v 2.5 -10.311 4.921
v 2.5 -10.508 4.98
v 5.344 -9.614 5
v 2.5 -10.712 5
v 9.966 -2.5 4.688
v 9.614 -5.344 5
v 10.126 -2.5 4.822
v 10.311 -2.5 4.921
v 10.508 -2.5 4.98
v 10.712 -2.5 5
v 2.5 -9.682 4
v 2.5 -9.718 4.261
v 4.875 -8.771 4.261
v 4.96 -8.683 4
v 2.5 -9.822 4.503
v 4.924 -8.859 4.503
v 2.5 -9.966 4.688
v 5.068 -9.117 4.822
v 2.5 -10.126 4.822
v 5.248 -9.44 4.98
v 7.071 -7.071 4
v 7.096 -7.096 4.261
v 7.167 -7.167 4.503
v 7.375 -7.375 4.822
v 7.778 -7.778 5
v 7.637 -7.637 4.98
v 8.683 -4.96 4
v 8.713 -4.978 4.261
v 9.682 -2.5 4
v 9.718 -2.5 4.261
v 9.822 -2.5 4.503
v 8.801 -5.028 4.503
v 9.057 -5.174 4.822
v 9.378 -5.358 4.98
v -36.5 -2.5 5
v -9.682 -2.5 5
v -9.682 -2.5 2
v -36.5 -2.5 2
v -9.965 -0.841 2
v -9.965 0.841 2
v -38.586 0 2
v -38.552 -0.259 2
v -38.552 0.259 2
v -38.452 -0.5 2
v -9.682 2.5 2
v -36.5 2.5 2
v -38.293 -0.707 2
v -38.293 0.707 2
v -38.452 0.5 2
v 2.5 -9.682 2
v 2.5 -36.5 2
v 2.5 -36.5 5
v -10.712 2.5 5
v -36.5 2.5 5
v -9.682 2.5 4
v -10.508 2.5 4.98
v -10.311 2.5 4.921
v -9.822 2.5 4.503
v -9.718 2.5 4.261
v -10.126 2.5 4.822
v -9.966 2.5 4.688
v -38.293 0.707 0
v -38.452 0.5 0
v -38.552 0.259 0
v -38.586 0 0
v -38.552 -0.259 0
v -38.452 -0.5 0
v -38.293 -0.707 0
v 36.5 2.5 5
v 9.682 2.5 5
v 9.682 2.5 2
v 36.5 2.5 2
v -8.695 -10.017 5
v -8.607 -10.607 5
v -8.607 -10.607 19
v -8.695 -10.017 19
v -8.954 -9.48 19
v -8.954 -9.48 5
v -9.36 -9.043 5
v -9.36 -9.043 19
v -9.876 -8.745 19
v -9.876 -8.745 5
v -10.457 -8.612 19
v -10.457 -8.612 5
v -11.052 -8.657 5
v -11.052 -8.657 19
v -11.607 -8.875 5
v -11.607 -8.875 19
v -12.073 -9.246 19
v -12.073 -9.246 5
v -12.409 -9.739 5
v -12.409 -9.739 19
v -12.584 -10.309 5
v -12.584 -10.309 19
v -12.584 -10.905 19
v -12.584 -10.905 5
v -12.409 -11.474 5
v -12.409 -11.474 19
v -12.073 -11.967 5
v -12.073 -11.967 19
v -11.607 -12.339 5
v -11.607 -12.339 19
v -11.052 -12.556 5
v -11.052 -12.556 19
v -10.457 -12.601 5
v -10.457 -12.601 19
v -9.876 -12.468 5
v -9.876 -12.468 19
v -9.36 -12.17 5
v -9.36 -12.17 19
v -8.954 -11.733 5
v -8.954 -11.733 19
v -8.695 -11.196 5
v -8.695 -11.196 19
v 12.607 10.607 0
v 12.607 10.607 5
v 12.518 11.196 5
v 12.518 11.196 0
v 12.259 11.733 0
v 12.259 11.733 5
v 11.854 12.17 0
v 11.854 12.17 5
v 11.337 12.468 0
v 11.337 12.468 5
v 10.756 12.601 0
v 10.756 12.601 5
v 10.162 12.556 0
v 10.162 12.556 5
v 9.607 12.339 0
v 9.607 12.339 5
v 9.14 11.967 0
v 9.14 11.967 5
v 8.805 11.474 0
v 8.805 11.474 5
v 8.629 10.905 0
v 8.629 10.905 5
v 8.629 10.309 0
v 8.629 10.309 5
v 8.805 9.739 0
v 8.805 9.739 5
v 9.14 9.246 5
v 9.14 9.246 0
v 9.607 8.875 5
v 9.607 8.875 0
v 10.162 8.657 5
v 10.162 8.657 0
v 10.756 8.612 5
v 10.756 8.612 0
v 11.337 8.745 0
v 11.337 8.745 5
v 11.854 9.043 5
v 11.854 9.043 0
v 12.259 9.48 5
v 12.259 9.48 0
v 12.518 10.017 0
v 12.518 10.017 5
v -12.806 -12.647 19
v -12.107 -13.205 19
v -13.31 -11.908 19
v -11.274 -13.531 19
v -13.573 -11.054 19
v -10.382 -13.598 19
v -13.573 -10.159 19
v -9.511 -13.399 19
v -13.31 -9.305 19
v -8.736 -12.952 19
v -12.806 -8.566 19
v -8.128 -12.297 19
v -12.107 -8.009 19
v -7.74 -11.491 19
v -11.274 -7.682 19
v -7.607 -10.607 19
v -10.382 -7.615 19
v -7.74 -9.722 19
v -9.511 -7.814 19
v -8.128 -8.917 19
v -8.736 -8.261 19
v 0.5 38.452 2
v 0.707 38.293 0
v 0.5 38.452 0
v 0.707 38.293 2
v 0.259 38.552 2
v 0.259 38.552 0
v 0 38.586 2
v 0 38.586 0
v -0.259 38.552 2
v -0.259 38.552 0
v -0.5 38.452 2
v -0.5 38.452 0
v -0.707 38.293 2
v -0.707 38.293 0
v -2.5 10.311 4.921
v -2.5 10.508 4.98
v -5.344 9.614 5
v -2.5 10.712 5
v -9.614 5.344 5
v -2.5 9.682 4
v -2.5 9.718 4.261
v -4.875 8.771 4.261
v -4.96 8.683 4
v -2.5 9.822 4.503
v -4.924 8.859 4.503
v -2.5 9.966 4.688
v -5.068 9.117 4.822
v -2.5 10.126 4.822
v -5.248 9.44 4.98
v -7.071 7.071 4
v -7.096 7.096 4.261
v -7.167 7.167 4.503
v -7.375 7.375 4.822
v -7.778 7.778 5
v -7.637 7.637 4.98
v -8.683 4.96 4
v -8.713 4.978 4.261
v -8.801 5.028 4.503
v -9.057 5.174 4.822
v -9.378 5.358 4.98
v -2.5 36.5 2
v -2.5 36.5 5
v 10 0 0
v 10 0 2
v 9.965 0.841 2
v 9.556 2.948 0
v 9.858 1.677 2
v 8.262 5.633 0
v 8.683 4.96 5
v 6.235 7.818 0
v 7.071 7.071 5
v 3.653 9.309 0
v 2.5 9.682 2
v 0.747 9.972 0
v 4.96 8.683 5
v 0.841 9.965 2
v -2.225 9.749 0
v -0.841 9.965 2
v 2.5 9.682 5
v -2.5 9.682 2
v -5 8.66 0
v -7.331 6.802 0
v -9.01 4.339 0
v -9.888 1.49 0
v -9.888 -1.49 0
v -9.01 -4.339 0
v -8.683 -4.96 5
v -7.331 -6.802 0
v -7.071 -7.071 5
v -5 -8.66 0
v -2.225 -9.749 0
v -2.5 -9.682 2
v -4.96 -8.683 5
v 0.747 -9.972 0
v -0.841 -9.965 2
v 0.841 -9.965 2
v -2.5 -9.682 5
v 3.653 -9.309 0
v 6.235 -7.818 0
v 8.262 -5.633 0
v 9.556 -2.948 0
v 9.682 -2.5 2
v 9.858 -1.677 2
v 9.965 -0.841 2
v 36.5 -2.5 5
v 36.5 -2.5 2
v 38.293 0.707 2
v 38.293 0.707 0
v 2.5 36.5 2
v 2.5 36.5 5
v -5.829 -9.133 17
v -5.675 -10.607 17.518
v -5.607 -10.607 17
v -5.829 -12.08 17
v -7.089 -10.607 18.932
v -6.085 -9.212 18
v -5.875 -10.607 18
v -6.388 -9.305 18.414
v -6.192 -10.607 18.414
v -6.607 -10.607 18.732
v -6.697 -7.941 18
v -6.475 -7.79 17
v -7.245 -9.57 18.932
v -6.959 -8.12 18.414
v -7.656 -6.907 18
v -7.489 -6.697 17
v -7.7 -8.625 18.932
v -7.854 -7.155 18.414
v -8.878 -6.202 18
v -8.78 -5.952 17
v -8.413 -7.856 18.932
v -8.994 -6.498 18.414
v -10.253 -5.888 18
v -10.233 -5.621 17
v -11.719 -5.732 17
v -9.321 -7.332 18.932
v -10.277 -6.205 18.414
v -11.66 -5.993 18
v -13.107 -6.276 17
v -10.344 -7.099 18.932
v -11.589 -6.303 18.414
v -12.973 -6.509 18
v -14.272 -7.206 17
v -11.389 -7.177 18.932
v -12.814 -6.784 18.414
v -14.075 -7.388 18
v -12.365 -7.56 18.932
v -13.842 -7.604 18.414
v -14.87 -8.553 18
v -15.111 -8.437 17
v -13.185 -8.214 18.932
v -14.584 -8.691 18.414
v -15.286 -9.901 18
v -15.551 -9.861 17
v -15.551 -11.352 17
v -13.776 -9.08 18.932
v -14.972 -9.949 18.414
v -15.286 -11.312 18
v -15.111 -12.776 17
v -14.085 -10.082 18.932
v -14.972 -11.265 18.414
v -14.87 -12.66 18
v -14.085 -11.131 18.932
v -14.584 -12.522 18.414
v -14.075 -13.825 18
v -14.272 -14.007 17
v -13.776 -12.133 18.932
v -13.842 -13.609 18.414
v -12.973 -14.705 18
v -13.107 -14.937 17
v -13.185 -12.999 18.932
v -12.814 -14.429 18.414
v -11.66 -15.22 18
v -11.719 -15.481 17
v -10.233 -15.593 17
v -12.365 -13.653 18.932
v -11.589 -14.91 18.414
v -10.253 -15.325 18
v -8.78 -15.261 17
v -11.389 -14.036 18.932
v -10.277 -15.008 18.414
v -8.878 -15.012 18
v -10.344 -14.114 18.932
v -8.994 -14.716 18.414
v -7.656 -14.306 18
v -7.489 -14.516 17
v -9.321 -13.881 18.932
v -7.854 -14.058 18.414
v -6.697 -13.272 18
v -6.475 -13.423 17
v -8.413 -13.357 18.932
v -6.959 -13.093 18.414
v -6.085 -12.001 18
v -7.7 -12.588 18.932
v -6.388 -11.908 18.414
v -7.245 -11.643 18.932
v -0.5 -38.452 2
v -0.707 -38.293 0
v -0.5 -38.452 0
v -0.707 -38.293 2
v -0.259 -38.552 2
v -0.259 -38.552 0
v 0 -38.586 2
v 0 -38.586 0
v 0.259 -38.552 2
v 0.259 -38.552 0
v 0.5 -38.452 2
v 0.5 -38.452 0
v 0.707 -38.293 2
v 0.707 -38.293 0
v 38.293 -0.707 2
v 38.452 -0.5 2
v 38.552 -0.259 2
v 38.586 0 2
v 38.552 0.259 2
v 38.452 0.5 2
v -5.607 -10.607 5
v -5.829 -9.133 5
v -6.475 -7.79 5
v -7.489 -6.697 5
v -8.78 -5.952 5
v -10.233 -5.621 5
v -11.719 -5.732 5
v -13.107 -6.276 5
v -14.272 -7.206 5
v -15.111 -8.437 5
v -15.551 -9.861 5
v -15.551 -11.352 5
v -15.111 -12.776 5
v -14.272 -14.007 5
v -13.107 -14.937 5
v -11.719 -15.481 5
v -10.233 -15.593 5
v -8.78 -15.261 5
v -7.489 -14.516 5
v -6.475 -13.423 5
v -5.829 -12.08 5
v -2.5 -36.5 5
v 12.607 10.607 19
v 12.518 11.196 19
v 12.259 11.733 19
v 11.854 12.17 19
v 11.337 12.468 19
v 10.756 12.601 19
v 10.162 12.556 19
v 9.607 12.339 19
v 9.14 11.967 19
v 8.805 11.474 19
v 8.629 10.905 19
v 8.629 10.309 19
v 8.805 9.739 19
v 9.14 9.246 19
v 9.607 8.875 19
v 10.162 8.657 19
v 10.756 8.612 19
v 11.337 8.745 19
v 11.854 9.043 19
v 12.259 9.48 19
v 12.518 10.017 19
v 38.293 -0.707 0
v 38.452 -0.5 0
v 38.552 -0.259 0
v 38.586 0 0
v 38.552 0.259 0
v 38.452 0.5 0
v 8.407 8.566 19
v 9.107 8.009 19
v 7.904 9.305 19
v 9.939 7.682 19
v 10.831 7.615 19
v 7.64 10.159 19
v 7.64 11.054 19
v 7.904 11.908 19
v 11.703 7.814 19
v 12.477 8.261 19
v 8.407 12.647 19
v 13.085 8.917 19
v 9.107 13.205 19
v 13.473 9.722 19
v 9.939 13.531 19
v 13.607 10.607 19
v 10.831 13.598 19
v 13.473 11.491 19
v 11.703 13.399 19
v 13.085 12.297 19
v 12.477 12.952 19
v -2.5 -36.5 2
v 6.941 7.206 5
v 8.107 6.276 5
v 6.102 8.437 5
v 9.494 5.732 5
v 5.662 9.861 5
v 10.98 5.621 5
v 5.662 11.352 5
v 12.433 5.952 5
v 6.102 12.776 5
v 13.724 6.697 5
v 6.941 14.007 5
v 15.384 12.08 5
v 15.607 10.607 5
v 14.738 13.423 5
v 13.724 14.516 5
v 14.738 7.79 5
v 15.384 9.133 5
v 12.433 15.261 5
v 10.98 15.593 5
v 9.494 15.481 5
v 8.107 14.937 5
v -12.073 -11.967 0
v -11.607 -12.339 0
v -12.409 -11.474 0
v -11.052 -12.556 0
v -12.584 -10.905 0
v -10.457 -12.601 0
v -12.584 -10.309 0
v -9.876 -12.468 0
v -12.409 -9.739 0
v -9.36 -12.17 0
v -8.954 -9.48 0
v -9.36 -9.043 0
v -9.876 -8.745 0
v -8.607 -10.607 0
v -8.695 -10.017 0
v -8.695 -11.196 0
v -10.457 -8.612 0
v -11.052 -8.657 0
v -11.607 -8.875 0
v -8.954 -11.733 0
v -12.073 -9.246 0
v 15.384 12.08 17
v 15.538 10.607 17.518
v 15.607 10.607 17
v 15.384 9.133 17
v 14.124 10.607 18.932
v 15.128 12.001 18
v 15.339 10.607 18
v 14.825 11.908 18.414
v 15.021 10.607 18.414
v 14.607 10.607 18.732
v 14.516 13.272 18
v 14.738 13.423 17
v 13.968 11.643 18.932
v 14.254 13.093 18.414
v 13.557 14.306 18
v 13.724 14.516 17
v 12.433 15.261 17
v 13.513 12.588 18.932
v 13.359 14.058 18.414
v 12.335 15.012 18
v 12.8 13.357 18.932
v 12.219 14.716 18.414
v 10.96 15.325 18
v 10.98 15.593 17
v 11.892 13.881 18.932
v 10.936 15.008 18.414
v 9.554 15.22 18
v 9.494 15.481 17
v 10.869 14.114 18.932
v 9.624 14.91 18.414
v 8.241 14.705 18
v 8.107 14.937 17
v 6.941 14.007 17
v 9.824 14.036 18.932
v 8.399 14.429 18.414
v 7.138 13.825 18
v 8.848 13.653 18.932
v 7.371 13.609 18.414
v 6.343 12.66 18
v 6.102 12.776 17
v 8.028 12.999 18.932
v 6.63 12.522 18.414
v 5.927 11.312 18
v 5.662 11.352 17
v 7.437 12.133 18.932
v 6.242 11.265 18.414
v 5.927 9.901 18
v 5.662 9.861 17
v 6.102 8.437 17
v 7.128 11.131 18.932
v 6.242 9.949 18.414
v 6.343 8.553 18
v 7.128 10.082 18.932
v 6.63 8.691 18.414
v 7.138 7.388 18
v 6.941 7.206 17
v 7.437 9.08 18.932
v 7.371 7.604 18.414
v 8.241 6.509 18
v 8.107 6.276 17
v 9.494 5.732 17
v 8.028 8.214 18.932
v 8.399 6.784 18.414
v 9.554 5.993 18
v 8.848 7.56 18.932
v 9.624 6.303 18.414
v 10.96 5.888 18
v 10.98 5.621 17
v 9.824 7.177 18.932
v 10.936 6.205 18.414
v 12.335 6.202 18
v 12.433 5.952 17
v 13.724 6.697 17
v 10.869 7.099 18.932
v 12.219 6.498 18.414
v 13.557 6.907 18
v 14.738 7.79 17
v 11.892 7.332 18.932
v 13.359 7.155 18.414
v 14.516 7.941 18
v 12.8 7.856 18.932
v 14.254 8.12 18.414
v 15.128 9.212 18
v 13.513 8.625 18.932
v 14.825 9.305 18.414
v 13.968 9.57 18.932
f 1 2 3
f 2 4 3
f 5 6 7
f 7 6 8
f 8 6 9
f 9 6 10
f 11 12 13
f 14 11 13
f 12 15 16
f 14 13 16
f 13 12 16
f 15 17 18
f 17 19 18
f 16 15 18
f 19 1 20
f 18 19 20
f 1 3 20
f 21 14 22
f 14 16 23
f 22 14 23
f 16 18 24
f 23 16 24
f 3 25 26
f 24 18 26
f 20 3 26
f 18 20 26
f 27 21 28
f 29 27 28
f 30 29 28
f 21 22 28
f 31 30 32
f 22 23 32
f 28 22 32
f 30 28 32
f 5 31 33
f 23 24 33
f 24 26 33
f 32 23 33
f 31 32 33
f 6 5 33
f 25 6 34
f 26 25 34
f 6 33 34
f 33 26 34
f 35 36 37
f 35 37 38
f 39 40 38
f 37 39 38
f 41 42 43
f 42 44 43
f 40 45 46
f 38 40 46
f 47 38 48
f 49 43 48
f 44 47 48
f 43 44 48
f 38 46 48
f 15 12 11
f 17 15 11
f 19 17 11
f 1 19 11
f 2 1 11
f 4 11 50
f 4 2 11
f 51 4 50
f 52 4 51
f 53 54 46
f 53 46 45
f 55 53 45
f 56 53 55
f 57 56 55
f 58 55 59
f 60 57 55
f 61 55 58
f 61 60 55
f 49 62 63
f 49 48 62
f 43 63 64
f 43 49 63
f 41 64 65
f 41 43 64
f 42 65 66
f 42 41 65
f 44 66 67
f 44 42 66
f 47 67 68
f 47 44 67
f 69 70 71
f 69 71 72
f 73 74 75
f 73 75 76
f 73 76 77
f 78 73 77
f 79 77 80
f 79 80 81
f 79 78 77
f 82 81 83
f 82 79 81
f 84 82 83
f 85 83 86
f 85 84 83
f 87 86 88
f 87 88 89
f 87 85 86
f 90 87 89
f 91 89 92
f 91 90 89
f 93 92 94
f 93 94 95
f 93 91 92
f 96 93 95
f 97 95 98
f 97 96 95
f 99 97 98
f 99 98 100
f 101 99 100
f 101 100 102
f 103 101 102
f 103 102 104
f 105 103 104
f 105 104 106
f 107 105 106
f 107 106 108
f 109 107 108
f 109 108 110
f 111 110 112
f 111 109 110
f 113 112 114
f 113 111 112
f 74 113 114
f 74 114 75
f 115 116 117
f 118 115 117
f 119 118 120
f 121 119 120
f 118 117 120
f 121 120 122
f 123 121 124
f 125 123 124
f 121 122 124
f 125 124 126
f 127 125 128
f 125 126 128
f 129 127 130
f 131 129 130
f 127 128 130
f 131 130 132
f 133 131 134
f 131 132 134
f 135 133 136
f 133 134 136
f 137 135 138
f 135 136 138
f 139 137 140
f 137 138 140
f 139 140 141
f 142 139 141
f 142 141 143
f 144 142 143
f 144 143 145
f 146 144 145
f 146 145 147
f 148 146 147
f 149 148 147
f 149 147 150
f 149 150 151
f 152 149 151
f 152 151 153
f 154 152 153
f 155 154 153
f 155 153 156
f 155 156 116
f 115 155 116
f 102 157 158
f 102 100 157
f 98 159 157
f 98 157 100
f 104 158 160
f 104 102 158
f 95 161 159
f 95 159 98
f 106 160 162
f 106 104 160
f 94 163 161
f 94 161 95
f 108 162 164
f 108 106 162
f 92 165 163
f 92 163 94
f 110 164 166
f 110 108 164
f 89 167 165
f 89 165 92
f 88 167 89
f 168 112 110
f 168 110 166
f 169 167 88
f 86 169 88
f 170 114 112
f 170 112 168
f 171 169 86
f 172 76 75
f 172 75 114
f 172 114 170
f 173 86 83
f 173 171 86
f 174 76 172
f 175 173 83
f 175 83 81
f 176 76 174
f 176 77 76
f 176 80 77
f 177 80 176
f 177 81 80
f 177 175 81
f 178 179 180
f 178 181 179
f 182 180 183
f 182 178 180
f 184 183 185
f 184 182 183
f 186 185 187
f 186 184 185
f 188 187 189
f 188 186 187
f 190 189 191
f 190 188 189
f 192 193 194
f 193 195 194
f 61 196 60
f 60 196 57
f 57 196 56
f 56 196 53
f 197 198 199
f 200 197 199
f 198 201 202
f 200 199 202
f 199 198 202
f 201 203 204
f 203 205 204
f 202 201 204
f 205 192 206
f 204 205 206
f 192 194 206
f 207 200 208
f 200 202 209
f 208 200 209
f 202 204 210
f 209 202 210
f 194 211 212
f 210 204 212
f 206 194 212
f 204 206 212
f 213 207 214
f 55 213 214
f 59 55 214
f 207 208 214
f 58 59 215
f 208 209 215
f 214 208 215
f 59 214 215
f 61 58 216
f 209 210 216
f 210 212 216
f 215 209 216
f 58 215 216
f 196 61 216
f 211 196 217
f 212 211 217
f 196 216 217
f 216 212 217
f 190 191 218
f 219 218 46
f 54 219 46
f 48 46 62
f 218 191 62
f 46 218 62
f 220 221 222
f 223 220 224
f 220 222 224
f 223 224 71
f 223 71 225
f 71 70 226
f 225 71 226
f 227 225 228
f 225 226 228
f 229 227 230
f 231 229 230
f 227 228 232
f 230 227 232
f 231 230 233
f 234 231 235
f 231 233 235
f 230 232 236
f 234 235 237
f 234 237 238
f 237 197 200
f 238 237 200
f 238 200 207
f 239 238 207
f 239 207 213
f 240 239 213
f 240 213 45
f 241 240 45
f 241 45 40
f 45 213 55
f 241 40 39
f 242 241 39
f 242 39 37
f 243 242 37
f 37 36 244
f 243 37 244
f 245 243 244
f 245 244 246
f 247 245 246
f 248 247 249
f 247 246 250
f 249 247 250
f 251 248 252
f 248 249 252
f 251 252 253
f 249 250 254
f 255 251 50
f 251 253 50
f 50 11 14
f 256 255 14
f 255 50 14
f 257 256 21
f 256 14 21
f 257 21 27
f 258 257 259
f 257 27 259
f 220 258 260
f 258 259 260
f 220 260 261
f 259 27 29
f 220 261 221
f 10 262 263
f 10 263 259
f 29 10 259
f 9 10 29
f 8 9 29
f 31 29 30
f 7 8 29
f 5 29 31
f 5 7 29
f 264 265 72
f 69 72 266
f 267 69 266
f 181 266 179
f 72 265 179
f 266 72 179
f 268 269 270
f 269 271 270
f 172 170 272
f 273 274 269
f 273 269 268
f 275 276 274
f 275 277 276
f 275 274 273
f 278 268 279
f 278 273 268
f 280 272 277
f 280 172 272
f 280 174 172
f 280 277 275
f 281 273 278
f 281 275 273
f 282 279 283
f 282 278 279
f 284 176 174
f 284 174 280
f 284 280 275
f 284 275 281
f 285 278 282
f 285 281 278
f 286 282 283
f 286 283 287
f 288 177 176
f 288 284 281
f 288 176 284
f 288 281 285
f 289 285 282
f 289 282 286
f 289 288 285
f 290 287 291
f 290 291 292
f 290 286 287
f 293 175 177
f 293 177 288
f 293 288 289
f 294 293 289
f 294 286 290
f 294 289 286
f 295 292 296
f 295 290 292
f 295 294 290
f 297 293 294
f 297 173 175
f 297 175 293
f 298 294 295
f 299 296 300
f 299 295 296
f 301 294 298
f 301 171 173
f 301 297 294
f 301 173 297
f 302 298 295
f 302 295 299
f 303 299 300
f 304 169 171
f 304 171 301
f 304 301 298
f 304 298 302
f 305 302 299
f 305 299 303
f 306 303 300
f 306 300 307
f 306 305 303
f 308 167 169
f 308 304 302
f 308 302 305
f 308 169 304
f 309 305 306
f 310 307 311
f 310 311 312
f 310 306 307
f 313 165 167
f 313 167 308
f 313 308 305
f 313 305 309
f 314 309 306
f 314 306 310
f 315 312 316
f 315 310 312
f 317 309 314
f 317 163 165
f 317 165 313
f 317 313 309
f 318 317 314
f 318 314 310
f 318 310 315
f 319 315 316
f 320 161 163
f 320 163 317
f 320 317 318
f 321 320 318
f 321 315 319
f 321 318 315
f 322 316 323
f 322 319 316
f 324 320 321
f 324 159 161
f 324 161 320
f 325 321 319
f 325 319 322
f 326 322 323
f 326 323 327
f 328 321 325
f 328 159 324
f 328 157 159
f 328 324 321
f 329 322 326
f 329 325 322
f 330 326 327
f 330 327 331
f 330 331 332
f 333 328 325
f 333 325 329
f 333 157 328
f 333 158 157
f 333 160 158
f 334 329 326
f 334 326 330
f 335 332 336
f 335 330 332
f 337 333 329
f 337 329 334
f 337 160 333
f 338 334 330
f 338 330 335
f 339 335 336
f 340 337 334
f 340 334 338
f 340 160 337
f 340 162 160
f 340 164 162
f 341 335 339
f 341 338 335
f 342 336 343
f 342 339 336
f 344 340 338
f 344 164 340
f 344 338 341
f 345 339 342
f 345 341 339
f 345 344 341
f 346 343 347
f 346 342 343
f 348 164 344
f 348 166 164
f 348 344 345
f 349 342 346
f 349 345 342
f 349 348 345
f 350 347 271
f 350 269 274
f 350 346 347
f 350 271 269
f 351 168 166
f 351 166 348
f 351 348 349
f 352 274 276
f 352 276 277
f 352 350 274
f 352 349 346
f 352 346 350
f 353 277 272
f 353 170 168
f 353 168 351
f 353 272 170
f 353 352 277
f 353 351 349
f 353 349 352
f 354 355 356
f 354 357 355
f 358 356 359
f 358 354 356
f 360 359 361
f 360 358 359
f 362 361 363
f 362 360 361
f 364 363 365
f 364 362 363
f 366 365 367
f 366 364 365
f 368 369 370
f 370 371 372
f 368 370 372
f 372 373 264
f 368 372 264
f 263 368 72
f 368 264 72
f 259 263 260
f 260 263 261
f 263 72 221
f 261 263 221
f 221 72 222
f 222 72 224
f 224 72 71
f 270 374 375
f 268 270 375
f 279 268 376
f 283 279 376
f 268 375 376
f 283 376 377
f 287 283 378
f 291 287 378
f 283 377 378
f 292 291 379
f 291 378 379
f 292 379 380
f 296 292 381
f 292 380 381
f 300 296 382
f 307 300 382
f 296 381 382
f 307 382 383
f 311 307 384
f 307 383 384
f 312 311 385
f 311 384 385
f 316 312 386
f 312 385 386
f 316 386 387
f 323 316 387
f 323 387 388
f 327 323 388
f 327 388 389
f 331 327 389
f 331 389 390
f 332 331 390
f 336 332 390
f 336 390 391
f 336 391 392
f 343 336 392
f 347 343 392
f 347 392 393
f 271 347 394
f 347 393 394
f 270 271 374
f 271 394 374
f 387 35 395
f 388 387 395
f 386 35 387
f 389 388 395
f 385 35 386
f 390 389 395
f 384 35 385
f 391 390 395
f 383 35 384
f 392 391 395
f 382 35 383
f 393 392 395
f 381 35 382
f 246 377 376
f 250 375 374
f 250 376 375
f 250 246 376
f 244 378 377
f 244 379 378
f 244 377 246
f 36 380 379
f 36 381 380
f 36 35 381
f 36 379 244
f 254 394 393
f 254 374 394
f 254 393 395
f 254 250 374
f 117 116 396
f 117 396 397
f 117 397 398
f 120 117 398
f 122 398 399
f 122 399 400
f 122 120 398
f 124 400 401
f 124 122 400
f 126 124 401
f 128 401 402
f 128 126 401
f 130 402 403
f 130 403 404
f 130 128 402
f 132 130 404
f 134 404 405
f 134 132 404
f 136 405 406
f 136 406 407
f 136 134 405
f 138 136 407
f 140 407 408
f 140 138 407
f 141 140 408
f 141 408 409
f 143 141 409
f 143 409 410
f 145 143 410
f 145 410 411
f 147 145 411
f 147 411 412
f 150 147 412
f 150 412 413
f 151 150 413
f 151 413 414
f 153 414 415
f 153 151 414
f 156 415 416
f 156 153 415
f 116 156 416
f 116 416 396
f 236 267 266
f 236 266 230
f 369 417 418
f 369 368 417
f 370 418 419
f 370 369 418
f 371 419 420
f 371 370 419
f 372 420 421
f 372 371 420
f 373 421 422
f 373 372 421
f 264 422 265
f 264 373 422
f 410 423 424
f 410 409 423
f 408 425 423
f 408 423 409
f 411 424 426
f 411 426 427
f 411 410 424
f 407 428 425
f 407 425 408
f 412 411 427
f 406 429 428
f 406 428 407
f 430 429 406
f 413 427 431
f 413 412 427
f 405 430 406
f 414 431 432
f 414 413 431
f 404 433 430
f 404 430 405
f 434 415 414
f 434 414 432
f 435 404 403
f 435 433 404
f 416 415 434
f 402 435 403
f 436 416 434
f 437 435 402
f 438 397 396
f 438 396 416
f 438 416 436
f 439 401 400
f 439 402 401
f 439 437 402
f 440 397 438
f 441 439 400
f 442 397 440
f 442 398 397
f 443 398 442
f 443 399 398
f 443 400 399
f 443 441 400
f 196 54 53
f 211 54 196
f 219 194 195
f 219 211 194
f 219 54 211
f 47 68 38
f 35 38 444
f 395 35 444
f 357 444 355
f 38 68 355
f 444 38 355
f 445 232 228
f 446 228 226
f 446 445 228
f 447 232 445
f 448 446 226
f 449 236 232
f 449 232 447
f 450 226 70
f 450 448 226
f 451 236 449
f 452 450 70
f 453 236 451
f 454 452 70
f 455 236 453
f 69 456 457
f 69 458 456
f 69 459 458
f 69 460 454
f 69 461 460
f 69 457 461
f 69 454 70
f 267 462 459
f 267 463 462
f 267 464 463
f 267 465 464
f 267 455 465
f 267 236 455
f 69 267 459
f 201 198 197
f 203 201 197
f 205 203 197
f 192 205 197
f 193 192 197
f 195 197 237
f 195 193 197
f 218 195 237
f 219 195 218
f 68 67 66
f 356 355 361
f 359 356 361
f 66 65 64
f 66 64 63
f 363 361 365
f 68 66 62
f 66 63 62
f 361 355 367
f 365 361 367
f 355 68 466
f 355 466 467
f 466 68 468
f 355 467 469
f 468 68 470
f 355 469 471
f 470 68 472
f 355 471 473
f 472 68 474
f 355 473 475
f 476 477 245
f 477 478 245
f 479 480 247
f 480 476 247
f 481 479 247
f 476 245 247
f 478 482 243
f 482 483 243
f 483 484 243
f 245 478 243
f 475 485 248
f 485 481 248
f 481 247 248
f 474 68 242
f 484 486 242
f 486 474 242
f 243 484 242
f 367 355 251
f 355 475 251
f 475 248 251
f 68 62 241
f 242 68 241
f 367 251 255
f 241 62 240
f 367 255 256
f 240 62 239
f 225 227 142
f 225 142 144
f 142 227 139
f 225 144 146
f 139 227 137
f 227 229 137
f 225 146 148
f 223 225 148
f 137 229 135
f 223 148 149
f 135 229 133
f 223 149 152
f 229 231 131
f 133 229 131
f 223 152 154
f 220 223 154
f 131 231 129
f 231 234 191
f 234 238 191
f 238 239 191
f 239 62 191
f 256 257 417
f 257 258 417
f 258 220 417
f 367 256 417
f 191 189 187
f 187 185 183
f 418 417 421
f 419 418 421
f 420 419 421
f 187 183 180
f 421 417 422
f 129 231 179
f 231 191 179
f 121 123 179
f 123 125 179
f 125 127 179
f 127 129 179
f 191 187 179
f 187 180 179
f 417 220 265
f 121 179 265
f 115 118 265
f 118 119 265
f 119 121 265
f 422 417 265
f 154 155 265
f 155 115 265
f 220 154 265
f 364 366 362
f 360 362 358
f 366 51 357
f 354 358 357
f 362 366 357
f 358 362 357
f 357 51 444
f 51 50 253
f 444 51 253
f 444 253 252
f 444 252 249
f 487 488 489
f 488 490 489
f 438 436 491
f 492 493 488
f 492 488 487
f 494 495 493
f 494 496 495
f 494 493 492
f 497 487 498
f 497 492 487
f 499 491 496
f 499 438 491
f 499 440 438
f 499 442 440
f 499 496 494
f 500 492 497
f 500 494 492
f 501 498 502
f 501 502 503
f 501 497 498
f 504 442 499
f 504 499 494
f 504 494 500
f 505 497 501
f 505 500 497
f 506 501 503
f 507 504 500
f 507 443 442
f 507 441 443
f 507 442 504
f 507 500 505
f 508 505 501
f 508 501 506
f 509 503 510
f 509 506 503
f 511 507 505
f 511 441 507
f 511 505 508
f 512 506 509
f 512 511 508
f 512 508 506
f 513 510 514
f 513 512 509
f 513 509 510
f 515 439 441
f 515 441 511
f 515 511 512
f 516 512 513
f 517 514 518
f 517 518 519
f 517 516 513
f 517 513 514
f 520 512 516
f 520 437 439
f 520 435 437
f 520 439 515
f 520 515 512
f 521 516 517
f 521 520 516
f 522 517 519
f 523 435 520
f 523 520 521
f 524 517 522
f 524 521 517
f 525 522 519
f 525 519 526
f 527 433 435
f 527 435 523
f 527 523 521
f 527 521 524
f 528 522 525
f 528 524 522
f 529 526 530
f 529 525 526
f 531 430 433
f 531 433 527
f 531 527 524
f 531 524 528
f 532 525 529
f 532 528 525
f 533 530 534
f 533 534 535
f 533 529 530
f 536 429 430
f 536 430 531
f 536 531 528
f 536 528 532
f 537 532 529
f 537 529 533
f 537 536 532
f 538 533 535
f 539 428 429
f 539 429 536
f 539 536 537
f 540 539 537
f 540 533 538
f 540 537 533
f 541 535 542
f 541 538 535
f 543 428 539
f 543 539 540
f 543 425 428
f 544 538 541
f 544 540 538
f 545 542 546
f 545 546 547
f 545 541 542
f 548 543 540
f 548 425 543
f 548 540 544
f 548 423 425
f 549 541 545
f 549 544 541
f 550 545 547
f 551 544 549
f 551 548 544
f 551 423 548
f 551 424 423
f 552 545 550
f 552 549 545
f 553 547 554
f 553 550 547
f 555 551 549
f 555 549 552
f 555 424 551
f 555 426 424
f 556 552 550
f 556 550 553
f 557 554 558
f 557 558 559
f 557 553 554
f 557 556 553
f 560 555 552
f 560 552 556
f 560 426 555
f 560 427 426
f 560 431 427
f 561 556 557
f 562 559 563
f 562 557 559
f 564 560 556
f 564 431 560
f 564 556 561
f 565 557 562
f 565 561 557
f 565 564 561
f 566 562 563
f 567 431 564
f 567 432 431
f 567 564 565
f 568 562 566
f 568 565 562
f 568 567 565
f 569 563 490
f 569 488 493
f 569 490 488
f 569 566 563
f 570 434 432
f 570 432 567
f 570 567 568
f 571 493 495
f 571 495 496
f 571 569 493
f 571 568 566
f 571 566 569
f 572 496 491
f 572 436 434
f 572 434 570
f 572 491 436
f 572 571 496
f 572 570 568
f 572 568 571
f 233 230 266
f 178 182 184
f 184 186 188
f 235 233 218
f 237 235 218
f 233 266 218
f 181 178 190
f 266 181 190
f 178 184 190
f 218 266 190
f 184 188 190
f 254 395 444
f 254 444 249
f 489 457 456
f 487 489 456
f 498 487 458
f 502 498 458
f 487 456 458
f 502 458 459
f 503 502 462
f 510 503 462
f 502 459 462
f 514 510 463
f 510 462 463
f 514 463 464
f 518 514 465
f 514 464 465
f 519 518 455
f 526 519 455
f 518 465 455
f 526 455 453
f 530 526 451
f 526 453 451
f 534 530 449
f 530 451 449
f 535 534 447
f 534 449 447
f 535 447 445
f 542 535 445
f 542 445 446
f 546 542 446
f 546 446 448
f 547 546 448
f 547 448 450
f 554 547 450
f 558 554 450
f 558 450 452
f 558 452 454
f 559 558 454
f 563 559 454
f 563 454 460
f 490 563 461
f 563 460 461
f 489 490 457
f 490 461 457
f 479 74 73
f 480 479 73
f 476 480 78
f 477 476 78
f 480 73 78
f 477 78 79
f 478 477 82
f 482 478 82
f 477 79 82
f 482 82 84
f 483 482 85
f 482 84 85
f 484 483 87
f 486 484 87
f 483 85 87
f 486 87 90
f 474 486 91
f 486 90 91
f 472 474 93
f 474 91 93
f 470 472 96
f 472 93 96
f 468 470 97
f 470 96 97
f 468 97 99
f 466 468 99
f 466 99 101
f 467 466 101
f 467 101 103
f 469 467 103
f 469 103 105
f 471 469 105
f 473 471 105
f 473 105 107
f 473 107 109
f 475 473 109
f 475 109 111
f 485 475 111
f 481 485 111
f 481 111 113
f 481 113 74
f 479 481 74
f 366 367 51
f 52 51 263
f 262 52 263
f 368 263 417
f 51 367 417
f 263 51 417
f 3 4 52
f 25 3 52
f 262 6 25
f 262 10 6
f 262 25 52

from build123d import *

# Parameters (mm, degrees)
PAD_DEPTH       = 5
POCKET_DEPTH    = 3
SKETCH002_R     = 5
SKETCH002_R_2   = 2
PAD001_DEPTH    = 14
FILLET_R        = 1
FILLET001_R     = 1
FILLET002_R     = 1
FILLET003_R     = 1
SKETCH003_R     = 10
POCKET001_DEPTH = 5.001
SKETCH004_R     = 2
POCKET002_DEPTH = 5.001
FILLET004_R     = 1
FILLET005_R     = 1
FILLET006_R     = 2
FILLET007_R     = 2


with BuildPart() as part:
    # Sketch → Pad (new body)
    with BuildSketch(Plane.XY):
        Polygon((0, 39), (-39, 0), (0, -39), (39, 0), align=None)
    extrude(amount=PAD_DEPTH)

    # Sketch001 → Pocket (cut)
    with BuildSketch(Plane.XY.offset(5)):
        Polygon((-42.5, 2.5), (-2.5, 2.5), (-2.5, 42.5), (2.5, 42.5), (2.5, 2.5), (42.5, 2.5), (42.5, -2.5), (2.5, -2.5), (2.5, -42.5), (-2.5, -42.5), (-2.5, -2.5), (-42.5, -2.5), align=None)
    extrude(amount=-POCKET_DEPTH, mode=Mode.SUBTRACT)

    # Sketch002 → Pad001 (new body)
    with BuildSketch(Plane.XY.offset(5)):
        with Locations((10.606602, 10.606602)):
            Circle(SKETCH002_R)
        with Locations((10.606602, 10.606602)):
            Circle(SKETCH002_R_2, mode=Mode.SUBTRACT)
        with Locations((-10.606602, -10.606602)):
            Circle(SKETCH002_R)
        with Locations((-10.606602, -10.606602)):
            Circle(SKETCH002_R_2, mode=Mode.SUBTRACT)
    extrude(amount=PAD001_DEPTH)

    # Fillet
    fillet_edges = [part.edges().sort_by_distance(p)[0] for p in [
        (-39, 0, 1),
    ]]
    fillet(fillet_edges, radius=FILLET_R)

    # Fillet001
    fillet001_edges = [part.edges().sort_by_distance(p)[0] for p in [
        (0, -39, 1),
    ]]
    fillet(fillet001_edges, radius=FILLET001_R)

    # Fillet002
    fillet002_edges = [part.edges().sort_by_distance(p)[0] for p in [
        (39, 0, 1),
    ]]
    fillet(fillet002_edges, radius=FILLET002_R)

    # Fillet003
    fillet003_edges = [part.edges().sort_by_distance(p)[0] for p in [
        (0, 39, 1),
    ]]
    fillet(fillet003_edges, radius=FILLET003_R)

    # Sketch003 → Pocket001 (cut, through all)
    with BuildSketch(Plane.XY.offset(5)):
        Circle(SKETCH003_R)
    extrude(amount=-POCKET001_DEPTH, mode=Mode.SUBTRACT)

    # Sketch004 → Pocket002 (cut, through all)
    with BuildSketch(Plane.XY.offset(5)):
        with Locations((-10.606602, -10.606602)):
            Circle(SKETCH004_R)
        with Locations((10.606602, 10.606602)):
            Circle(SKETCH004_R)
    extrude(amount=-POCKET002_DEPTH, mode=Mode.SUBTRACT)

    # Fillet004
    fillet004_edges = [part.edges().sort_by_distance(p)[0] for p in [
        (-7.071068, 7.071068, 5),
    ]]
    fillet(fillet004_edges, radius=FILLET004_R)

    # Fillet005
    fillet005_edges = [part.edges().sort_by_distance(p)[0] for p in [
        (7.071068, -7.071068, 5),
    ]]
    fillet(fillet005_edges, radius=FILLET005_R)

    # Fillet006
    fillet006_edges = [part.edges().sort_by_distance(p)[0] for p in [
        (5.606602, 10.606602, 19),
    ]]
    fillet(fillet006_edges, radius=FILLET006_R)

    # Fillet007
    fillet007_edges = [part.edges().sort_by_distance(p)[0] for p in [
        (-15.606602, -10.606602, 19),
    ]]
    fillet(fillet007_edges, radius=FILLET007_R)


solid = part.part
